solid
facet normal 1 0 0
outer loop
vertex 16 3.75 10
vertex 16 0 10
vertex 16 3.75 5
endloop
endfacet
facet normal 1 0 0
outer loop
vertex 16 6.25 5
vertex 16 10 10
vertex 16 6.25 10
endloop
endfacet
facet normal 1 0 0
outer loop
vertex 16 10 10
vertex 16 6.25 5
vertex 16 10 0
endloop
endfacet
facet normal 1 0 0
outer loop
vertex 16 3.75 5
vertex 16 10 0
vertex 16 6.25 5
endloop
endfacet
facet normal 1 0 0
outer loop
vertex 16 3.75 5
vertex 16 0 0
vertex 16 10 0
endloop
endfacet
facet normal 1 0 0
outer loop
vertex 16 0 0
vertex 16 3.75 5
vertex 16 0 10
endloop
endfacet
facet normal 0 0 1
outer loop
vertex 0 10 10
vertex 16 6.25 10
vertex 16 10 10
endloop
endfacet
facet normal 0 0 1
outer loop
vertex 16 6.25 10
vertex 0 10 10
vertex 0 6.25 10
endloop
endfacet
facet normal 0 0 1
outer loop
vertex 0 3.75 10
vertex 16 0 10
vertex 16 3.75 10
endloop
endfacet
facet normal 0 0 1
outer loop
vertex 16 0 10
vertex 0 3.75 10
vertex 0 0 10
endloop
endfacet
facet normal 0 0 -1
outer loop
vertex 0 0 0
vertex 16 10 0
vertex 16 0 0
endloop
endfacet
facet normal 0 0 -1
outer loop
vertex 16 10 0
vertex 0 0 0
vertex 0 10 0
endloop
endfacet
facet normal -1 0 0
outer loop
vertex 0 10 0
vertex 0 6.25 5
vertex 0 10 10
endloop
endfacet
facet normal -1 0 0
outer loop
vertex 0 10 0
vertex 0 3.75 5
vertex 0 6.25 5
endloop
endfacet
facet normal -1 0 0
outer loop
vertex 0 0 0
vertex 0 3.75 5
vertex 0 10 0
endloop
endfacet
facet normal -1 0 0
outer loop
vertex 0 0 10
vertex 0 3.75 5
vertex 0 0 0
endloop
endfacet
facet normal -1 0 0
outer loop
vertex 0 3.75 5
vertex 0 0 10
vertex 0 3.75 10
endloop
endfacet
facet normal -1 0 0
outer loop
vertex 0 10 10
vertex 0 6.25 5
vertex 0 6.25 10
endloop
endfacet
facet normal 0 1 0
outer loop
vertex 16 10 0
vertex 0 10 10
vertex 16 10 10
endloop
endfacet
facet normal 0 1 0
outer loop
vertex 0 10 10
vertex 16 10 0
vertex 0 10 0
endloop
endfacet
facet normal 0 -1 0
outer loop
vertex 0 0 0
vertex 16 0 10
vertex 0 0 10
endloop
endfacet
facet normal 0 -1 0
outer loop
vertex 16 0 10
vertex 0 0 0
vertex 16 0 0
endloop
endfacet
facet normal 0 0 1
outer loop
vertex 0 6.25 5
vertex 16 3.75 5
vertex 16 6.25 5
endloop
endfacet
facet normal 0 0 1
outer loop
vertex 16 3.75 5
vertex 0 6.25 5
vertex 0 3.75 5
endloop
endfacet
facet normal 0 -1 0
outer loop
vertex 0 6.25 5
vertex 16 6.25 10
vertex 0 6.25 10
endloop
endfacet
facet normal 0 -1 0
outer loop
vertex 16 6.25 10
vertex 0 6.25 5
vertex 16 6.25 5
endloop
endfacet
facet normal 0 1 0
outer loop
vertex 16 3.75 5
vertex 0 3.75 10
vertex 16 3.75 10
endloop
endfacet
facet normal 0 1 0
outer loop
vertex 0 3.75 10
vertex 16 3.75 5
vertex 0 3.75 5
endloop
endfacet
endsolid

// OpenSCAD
$fn = 32;

// ----------------------------------------------------------------------
// Micro clip: slotted block, 5-20 mm class
// ----------------------------------------------------------------------

// --- parameters (mm) ---
block_l = 16;             // block length, X
block_w = 10;             // block width, Y
block_h = 10;             // block height, Z
slot_w = 2.5;             // slot width
slot_d = 5;               // slot depth from the top

difference() {
  cube([block_l, block_w, block_h]);
  translate([-1, block_w / 2 - slot_w / 2, block_h - slot_d])
    cube([block_l + 2, slot_w, slot_d + 1]);
}
